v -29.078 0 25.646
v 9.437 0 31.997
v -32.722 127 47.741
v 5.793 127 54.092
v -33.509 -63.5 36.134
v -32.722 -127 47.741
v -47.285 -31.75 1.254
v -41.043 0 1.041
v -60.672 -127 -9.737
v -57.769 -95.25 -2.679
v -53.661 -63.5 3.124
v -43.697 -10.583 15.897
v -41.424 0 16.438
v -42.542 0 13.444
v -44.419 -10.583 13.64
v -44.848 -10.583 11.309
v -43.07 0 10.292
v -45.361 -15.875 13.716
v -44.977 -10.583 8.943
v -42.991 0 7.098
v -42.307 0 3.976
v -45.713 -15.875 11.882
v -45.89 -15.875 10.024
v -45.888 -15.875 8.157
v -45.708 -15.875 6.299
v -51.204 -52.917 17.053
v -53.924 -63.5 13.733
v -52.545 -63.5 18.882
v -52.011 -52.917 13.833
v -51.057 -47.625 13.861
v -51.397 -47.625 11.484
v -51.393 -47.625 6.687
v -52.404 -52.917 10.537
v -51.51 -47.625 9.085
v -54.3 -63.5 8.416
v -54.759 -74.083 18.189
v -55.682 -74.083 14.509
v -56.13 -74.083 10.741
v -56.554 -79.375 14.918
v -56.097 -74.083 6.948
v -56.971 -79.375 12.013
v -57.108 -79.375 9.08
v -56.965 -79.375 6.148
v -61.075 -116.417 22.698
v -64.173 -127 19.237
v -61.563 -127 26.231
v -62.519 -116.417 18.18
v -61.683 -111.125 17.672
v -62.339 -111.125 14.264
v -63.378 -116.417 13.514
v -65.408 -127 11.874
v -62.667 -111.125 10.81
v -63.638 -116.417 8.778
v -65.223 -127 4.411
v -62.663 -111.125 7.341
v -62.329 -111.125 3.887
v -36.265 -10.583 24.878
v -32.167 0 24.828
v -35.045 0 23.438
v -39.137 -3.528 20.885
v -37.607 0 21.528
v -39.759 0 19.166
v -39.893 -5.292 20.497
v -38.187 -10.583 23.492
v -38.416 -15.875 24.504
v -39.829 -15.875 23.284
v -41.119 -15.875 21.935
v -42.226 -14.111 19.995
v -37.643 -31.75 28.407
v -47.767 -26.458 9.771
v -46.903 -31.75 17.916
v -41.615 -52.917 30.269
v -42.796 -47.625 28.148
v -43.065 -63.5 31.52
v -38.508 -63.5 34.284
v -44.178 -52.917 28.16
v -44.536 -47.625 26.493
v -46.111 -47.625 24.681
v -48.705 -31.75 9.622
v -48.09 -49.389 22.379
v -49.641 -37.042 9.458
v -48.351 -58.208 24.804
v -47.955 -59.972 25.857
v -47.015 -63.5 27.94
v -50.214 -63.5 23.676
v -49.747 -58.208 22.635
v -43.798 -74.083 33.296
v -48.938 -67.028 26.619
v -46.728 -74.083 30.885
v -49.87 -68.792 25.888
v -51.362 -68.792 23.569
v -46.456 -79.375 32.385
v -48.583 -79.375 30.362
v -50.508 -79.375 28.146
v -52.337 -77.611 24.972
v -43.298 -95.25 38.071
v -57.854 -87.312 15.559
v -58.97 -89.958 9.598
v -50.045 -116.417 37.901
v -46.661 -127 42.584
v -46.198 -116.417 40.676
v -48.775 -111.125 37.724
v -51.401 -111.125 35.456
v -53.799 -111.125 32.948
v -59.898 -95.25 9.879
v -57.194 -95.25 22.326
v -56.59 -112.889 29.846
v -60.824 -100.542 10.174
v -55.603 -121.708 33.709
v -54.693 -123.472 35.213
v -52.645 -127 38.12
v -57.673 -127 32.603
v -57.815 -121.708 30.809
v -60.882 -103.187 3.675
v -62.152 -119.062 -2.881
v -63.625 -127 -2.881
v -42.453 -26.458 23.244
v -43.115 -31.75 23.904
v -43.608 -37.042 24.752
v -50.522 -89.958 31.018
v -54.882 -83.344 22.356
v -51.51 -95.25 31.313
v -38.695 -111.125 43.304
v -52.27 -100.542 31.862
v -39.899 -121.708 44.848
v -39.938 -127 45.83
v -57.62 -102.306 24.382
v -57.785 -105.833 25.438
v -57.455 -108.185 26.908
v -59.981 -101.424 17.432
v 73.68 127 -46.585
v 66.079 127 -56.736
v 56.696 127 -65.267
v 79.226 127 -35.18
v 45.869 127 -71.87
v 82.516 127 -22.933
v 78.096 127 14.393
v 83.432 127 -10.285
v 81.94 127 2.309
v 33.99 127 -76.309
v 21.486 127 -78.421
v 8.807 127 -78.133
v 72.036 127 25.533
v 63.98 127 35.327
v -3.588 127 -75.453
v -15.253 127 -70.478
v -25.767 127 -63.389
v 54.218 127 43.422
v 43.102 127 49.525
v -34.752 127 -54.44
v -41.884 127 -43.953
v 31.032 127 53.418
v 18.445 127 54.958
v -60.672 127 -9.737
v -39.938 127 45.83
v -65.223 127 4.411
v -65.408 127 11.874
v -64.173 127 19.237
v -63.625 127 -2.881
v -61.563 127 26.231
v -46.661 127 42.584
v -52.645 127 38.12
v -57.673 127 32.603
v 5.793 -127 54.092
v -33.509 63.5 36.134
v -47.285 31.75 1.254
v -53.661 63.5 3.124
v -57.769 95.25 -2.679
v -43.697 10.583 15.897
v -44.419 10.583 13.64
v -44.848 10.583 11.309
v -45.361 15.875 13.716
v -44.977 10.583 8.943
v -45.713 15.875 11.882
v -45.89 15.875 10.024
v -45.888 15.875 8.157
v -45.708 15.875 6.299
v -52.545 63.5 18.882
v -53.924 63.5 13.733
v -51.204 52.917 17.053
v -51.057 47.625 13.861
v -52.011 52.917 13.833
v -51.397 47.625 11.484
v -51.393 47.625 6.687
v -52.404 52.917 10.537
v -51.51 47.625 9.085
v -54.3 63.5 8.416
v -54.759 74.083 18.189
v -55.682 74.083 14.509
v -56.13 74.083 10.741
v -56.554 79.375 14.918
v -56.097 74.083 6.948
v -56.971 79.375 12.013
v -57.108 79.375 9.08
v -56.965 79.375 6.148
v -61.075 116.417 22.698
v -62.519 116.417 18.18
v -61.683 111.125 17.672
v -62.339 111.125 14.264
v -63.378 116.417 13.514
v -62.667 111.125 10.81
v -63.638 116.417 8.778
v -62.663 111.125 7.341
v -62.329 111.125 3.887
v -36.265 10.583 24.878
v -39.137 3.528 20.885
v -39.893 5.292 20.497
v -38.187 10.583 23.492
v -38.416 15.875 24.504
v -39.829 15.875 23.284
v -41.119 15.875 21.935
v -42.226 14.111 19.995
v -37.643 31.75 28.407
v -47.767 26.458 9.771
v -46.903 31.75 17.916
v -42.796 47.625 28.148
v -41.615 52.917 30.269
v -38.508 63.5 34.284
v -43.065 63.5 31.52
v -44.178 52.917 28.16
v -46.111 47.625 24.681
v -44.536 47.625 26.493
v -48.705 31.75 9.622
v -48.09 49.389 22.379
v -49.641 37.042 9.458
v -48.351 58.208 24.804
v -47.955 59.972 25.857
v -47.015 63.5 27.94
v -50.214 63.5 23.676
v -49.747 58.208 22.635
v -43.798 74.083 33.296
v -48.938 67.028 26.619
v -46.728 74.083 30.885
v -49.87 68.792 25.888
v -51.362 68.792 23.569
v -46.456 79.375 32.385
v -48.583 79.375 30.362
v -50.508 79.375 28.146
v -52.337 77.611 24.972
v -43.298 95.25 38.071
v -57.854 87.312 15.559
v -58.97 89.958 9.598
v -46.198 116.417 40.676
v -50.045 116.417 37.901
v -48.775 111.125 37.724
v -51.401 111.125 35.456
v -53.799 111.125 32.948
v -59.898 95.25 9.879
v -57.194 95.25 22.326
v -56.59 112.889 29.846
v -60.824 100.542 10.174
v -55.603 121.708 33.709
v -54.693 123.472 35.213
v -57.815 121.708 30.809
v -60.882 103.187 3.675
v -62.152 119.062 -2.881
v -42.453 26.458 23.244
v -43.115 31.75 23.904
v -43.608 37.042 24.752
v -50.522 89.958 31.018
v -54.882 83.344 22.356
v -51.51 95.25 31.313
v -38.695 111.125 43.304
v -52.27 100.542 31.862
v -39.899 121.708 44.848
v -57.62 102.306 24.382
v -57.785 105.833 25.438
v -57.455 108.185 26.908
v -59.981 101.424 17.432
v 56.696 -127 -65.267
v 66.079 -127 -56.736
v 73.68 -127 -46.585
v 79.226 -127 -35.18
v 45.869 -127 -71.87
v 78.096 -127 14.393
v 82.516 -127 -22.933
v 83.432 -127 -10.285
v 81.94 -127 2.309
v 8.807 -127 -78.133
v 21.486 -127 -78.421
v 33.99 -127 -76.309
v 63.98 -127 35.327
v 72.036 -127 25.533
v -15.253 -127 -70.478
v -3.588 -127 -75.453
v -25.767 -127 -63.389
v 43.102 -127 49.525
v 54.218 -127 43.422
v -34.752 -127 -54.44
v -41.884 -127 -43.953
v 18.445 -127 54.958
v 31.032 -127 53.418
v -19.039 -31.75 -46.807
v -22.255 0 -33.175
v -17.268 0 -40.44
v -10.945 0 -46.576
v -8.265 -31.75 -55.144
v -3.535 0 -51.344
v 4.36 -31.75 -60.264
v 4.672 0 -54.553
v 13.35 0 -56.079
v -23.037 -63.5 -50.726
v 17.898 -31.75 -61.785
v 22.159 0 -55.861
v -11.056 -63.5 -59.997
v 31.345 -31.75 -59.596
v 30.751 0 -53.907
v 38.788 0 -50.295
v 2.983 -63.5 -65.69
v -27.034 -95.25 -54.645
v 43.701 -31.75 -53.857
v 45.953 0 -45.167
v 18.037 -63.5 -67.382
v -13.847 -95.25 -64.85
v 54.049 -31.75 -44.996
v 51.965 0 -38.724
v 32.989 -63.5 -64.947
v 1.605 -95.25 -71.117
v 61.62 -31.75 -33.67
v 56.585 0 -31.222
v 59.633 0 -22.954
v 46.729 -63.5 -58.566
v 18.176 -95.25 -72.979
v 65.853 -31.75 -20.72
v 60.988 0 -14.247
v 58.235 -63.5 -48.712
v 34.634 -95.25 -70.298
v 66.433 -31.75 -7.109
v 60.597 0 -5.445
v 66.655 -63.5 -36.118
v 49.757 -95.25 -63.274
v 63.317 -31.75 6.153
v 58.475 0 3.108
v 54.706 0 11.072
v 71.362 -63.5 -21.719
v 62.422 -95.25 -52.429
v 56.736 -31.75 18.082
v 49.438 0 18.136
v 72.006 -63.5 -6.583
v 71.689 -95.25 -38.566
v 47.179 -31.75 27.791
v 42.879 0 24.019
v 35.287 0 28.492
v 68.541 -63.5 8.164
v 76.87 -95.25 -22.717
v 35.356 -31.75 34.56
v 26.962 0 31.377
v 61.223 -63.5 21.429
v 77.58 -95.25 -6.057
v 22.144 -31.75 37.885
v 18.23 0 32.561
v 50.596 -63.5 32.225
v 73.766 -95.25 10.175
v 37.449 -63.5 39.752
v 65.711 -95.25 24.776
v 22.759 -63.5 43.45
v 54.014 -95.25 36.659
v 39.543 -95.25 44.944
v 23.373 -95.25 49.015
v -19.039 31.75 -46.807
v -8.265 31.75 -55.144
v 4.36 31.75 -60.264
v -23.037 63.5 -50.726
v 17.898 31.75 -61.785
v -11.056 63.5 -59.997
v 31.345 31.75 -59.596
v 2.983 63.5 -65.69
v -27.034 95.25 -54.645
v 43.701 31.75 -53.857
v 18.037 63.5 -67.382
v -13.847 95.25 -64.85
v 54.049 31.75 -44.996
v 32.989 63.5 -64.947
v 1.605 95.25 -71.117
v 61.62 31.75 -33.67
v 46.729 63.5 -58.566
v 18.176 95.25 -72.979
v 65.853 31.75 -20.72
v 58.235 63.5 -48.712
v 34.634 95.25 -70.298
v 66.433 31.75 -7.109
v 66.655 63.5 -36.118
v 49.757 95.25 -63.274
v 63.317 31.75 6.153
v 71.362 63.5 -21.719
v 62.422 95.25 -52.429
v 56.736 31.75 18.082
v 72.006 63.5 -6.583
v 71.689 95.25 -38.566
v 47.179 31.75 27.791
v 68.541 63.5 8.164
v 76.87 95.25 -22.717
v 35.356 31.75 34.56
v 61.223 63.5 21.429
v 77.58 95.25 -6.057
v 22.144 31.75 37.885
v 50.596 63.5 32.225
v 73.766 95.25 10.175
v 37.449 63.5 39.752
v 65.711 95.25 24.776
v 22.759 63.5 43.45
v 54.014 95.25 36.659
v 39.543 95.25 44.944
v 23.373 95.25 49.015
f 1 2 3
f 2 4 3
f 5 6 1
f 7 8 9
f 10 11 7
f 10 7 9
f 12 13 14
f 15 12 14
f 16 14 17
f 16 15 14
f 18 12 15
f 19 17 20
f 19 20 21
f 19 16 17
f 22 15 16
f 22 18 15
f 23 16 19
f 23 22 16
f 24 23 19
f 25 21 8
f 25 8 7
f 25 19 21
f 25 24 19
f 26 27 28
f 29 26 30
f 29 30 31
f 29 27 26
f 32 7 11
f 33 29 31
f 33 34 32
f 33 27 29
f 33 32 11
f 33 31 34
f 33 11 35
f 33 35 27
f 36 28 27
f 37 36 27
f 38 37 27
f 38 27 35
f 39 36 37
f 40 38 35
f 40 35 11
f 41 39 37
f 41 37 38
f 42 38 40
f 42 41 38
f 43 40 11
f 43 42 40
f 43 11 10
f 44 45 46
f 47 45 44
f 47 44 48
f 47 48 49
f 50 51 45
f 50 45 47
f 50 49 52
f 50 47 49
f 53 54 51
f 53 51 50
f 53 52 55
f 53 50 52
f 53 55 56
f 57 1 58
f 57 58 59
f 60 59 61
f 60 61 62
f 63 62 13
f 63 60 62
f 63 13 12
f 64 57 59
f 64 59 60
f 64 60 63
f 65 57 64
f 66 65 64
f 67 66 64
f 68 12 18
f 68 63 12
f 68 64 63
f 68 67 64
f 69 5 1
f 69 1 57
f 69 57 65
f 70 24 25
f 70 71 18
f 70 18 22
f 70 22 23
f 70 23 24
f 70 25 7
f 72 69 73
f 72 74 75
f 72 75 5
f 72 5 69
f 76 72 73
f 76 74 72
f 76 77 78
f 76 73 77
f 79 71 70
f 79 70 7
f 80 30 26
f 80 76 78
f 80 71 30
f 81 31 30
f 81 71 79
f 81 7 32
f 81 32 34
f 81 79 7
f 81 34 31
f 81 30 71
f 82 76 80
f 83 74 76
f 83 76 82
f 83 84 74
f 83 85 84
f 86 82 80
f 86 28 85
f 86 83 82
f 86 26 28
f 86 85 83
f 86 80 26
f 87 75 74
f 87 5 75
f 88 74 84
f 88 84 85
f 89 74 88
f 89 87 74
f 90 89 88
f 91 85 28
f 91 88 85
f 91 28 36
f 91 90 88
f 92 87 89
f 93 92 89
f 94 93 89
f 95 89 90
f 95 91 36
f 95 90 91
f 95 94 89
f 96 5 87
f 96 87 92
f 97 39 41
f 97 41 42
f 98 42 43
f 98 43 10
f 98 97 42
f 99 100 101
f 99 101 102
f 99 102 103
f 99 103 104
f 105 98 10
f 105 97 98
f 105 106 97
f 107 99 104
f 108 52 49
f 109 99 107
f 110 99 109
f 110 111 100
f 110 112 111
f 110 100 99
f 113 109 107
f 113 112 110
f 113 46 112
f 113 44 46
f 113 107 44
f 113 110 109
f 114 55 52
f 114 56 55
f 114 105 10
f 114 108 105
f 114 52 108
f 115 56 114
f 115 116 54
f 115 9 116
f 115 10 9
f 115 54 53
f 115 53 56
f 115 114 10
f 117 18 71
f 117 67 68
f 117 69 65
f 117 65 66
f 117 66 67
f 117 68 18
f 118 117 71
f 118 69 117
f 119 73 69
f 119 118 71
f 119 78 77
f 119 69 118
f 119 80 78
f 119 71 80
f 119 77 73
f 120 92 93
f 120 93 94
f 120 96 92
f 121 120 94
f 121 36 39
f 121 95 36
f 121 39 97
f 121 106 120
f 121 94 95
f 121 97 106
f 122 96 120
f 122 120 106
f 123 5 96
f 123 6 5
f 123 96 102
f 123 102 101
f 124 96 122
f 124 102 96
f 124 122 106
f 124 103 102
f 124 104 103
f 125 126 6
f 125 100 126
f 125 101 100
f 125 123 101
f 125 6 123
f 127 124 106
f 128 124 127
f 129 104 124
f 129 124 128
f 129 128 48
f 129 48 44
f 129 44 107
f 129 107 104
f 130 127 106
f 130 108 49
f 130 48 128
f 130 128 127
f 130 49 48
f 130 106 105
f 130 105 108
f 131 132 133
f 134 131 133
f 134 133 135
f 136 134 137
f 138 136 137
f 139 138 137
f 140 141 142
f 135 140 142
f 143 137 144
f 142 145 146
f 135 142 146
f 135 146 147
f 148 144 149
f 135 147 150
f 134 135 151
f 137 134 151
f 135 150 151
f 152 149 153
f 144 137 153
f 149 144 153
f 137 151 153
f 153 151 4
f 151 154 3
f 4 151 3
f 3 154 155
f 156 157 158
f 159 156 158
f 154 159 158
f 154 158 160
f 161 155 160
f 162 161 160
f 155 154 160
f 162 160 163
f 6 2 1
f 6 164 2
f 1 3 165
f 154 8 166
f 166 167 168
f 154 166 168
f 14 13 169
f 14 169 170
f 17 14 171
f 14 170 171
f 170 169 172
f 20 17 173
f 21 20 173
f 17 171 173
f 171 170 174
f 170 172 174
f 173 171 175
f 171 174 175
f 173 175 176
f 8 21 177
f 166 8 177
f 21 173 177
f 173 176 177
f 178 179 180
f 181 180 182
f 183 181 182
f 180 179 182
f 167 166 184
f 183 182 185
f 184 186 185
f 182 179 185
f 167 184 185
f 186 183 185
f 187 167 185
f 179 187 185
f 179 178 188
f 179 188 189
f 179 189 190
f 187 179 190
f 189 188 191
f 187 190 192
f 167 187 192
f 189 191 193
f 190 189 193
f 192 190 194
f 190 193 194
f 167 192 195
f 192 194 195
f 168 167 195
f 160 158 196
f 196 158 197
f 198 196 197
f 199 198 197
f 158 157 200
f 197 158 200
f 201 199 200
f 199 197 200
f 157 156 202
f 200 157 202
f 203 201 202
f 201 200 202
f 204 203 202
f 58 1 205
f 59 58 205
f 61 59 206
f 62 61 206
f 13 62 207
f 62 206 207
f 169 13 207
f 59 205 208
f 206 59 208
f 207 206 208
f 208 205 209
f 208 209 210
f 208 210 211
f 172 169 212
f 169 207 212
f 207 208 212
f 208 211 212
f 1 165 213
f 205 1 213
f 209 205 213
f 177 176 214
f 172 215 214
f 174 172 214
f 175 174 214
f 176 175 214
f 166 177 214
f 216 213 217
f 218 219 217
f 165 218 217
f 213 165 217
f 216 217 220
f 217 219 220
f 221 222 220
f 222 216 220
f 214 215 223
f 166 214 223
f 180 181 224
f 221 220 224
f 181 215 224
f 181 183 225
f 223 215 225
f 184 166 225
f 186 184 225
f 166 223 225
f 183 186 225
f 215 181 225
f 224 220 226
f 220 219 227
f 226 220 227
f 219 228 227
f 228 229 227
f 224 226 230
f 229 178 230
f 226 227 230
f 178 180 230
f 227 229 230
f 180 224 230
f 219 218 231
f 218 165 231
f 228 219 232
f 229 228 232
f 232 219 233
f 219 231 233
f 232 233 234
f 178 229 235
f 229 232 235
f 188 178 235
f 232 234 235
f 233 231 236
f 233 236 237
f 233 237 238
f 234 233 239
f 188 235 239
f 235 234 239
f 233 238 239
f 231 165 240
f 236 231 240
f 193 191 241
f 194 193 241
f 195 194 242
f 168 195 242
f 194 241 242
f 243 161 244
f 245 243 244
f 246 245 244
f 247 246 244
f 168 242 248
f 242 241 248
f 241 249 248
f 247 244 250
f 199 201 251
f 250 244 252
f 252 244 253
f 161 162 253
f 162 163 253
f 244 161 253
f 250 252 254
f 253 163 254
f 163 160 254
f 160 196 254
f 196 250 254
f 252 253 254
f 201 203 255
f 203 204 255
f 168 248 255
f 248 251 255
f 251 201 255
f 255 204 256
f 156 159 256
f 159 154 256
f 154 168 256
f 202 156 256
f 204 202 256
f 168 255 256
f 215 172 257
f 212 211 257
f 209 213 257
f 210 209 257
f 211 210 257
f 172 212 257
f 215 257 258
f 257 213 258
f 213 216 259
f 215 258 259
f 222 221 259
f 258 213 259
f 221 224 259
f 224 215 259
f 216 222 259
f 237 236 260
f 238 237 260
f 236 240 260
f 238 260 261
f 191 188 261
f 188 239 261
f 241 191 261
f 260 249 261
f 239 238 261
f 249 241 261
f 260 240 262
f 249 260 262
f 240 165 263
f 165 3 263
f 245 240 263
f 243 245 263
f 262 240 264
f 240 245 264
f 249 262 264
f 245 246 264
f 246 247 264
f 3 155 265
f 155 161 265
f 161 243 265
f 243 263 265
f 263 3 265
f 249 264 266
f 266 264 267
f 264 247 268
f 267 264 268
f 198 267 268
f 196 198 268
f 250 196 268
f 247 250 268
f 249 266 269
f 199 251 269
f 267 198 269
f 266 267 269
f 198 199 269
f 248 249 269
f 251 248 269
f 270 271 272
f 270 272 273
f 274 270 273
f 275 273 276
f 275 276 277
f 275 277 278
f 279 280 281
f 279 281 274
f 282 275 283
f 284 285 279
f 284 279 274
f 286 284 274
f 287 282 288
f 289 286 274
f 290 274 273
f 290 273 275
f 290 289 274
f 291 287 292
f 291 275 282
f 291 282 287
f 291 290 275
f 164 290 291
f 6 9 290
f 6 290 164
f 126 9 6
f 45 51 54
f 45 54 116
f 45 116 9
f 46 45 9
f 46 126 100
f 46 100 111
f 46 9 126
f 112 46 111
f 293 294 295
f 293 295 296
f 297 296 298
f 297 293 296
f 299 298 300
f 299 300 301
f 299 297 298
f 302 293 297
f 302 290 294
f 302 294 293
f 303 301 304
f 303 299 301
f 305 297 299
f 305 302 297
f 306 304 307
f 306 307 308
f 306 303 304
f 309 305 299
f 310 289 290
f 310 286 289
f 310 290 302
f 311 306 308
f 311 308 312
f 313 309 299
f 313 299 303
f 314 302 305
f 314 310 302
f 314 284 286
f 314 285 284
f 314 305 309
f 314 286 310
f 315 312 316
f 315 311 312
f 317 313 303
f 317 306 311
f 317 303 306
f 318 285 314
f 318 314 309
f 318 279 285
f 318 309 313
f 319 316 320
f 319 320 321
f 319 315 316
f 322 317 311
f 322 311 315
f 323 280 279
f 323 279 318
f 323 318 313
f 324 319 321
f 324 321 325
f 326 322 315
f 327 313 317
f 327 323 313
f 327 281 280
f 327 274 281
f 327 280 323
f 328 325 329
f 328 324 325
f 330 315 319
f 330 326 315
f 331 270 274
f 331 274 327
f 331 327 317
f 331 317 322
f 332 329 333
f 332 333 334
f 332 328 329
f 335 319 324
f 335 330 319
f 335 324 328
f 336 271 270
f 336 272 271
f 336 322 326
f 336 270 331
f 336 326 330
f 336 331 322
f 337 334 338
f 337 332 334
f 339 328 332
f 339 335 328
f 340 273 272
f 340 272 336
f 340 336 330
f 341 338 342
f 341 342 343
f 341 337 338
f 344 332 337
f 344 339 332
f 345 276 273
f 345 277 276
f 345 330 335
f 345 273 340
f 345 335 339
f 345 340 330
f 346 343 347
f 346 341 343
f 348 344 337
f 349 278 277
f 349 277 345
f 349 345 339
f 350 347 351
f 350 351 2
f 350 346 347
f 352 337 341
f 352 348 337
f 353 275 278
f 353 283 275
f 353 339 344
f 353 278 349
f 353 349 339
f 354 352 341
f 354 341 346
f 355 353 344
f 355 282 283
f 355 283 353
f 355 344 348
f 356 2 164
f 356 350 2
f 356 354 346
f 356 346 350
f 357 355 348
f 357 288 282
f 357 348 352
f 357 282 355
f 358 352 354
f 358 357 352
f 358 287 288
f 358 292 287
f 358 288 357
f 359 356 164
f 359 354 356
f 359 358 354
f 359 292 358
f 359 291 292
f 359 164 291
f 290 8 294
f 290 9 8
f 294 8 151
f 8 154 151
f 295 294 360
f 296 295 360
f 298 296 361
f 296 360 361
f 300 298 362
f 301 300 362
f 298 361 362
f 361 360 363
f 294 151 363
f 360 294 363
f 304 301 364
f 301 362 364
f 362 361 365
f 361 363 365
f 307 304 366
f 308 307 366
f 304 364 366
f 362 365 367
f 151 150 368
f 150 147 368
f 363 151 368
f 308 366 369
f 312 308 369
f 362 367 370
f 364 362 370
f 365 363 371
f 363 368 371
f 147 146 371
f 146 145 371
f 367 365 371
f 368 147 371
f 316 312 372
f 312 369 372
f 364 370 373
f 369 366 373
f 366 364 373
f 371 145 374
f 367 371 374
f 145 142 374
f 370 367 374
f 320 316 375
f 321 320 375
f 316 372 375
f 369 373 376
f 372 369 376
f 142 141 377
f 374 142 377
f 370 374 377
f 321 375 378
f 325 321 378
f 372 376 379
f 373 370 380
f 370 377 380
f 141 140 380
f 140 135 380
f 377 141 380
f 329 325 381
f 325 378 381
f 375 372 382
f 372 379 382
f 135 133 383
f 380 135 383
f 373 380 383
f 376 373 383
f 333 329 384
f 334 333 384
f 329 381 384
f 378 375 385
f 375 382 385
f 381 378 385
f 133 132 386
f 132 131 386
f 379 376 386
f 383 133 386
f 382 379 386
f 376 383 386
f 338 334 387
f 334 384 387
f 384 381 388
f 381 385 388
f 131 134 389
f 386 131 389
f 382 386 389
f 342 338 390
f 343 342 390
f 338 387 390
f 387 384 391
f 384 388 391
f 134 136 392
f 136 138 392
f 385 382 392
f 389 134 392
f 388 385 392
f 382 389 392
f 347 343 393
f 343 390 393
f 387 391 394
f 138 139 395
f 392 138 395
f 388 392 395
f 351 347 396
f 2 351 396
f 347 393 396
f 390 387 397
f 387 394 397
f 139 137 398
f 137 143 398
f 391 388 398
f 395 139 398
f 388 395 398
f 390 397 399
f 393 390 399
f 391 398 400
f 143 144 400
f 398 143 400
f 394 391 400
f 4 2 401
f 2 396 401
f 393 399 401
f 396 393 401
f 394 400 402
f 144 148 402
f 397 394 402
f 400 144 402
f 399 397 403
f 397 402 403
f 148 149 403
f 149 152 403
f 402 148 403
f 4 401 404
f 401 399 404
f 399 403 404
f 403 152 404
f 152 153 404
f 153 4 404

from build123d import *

# Parameters (mm, degrees)
F1_DEPTH = 127
F1_TAPER = -10


with BuildPart() as f1:
    # F0 (on Front) → F1 (new body, symmetric)
    with BuildSketch(Plane.XZ):
        with BuildLine():
            Line((9.4366056551, 31.9971223519), (-29.0780882326, 25.645936495))
            ThreePointArc((-29.0780882326, 25.645936495), (-41.424375402, 16.4380068606), (-41.0428613167, 1.0408895322))
            Line((-41.0428613167, 1.0408895322), (-22.2548710668, -33.1750516271))
            ThreePointArc((-22.2548710668, -33.1750516271), (56.5854242226, -31.2215247106), (9.4366056551, 31.9971223519))
        make_face()
    extrude(amount=F1_DEPTH, both=True, taper=F1_TAPER)


solid = f1.part
